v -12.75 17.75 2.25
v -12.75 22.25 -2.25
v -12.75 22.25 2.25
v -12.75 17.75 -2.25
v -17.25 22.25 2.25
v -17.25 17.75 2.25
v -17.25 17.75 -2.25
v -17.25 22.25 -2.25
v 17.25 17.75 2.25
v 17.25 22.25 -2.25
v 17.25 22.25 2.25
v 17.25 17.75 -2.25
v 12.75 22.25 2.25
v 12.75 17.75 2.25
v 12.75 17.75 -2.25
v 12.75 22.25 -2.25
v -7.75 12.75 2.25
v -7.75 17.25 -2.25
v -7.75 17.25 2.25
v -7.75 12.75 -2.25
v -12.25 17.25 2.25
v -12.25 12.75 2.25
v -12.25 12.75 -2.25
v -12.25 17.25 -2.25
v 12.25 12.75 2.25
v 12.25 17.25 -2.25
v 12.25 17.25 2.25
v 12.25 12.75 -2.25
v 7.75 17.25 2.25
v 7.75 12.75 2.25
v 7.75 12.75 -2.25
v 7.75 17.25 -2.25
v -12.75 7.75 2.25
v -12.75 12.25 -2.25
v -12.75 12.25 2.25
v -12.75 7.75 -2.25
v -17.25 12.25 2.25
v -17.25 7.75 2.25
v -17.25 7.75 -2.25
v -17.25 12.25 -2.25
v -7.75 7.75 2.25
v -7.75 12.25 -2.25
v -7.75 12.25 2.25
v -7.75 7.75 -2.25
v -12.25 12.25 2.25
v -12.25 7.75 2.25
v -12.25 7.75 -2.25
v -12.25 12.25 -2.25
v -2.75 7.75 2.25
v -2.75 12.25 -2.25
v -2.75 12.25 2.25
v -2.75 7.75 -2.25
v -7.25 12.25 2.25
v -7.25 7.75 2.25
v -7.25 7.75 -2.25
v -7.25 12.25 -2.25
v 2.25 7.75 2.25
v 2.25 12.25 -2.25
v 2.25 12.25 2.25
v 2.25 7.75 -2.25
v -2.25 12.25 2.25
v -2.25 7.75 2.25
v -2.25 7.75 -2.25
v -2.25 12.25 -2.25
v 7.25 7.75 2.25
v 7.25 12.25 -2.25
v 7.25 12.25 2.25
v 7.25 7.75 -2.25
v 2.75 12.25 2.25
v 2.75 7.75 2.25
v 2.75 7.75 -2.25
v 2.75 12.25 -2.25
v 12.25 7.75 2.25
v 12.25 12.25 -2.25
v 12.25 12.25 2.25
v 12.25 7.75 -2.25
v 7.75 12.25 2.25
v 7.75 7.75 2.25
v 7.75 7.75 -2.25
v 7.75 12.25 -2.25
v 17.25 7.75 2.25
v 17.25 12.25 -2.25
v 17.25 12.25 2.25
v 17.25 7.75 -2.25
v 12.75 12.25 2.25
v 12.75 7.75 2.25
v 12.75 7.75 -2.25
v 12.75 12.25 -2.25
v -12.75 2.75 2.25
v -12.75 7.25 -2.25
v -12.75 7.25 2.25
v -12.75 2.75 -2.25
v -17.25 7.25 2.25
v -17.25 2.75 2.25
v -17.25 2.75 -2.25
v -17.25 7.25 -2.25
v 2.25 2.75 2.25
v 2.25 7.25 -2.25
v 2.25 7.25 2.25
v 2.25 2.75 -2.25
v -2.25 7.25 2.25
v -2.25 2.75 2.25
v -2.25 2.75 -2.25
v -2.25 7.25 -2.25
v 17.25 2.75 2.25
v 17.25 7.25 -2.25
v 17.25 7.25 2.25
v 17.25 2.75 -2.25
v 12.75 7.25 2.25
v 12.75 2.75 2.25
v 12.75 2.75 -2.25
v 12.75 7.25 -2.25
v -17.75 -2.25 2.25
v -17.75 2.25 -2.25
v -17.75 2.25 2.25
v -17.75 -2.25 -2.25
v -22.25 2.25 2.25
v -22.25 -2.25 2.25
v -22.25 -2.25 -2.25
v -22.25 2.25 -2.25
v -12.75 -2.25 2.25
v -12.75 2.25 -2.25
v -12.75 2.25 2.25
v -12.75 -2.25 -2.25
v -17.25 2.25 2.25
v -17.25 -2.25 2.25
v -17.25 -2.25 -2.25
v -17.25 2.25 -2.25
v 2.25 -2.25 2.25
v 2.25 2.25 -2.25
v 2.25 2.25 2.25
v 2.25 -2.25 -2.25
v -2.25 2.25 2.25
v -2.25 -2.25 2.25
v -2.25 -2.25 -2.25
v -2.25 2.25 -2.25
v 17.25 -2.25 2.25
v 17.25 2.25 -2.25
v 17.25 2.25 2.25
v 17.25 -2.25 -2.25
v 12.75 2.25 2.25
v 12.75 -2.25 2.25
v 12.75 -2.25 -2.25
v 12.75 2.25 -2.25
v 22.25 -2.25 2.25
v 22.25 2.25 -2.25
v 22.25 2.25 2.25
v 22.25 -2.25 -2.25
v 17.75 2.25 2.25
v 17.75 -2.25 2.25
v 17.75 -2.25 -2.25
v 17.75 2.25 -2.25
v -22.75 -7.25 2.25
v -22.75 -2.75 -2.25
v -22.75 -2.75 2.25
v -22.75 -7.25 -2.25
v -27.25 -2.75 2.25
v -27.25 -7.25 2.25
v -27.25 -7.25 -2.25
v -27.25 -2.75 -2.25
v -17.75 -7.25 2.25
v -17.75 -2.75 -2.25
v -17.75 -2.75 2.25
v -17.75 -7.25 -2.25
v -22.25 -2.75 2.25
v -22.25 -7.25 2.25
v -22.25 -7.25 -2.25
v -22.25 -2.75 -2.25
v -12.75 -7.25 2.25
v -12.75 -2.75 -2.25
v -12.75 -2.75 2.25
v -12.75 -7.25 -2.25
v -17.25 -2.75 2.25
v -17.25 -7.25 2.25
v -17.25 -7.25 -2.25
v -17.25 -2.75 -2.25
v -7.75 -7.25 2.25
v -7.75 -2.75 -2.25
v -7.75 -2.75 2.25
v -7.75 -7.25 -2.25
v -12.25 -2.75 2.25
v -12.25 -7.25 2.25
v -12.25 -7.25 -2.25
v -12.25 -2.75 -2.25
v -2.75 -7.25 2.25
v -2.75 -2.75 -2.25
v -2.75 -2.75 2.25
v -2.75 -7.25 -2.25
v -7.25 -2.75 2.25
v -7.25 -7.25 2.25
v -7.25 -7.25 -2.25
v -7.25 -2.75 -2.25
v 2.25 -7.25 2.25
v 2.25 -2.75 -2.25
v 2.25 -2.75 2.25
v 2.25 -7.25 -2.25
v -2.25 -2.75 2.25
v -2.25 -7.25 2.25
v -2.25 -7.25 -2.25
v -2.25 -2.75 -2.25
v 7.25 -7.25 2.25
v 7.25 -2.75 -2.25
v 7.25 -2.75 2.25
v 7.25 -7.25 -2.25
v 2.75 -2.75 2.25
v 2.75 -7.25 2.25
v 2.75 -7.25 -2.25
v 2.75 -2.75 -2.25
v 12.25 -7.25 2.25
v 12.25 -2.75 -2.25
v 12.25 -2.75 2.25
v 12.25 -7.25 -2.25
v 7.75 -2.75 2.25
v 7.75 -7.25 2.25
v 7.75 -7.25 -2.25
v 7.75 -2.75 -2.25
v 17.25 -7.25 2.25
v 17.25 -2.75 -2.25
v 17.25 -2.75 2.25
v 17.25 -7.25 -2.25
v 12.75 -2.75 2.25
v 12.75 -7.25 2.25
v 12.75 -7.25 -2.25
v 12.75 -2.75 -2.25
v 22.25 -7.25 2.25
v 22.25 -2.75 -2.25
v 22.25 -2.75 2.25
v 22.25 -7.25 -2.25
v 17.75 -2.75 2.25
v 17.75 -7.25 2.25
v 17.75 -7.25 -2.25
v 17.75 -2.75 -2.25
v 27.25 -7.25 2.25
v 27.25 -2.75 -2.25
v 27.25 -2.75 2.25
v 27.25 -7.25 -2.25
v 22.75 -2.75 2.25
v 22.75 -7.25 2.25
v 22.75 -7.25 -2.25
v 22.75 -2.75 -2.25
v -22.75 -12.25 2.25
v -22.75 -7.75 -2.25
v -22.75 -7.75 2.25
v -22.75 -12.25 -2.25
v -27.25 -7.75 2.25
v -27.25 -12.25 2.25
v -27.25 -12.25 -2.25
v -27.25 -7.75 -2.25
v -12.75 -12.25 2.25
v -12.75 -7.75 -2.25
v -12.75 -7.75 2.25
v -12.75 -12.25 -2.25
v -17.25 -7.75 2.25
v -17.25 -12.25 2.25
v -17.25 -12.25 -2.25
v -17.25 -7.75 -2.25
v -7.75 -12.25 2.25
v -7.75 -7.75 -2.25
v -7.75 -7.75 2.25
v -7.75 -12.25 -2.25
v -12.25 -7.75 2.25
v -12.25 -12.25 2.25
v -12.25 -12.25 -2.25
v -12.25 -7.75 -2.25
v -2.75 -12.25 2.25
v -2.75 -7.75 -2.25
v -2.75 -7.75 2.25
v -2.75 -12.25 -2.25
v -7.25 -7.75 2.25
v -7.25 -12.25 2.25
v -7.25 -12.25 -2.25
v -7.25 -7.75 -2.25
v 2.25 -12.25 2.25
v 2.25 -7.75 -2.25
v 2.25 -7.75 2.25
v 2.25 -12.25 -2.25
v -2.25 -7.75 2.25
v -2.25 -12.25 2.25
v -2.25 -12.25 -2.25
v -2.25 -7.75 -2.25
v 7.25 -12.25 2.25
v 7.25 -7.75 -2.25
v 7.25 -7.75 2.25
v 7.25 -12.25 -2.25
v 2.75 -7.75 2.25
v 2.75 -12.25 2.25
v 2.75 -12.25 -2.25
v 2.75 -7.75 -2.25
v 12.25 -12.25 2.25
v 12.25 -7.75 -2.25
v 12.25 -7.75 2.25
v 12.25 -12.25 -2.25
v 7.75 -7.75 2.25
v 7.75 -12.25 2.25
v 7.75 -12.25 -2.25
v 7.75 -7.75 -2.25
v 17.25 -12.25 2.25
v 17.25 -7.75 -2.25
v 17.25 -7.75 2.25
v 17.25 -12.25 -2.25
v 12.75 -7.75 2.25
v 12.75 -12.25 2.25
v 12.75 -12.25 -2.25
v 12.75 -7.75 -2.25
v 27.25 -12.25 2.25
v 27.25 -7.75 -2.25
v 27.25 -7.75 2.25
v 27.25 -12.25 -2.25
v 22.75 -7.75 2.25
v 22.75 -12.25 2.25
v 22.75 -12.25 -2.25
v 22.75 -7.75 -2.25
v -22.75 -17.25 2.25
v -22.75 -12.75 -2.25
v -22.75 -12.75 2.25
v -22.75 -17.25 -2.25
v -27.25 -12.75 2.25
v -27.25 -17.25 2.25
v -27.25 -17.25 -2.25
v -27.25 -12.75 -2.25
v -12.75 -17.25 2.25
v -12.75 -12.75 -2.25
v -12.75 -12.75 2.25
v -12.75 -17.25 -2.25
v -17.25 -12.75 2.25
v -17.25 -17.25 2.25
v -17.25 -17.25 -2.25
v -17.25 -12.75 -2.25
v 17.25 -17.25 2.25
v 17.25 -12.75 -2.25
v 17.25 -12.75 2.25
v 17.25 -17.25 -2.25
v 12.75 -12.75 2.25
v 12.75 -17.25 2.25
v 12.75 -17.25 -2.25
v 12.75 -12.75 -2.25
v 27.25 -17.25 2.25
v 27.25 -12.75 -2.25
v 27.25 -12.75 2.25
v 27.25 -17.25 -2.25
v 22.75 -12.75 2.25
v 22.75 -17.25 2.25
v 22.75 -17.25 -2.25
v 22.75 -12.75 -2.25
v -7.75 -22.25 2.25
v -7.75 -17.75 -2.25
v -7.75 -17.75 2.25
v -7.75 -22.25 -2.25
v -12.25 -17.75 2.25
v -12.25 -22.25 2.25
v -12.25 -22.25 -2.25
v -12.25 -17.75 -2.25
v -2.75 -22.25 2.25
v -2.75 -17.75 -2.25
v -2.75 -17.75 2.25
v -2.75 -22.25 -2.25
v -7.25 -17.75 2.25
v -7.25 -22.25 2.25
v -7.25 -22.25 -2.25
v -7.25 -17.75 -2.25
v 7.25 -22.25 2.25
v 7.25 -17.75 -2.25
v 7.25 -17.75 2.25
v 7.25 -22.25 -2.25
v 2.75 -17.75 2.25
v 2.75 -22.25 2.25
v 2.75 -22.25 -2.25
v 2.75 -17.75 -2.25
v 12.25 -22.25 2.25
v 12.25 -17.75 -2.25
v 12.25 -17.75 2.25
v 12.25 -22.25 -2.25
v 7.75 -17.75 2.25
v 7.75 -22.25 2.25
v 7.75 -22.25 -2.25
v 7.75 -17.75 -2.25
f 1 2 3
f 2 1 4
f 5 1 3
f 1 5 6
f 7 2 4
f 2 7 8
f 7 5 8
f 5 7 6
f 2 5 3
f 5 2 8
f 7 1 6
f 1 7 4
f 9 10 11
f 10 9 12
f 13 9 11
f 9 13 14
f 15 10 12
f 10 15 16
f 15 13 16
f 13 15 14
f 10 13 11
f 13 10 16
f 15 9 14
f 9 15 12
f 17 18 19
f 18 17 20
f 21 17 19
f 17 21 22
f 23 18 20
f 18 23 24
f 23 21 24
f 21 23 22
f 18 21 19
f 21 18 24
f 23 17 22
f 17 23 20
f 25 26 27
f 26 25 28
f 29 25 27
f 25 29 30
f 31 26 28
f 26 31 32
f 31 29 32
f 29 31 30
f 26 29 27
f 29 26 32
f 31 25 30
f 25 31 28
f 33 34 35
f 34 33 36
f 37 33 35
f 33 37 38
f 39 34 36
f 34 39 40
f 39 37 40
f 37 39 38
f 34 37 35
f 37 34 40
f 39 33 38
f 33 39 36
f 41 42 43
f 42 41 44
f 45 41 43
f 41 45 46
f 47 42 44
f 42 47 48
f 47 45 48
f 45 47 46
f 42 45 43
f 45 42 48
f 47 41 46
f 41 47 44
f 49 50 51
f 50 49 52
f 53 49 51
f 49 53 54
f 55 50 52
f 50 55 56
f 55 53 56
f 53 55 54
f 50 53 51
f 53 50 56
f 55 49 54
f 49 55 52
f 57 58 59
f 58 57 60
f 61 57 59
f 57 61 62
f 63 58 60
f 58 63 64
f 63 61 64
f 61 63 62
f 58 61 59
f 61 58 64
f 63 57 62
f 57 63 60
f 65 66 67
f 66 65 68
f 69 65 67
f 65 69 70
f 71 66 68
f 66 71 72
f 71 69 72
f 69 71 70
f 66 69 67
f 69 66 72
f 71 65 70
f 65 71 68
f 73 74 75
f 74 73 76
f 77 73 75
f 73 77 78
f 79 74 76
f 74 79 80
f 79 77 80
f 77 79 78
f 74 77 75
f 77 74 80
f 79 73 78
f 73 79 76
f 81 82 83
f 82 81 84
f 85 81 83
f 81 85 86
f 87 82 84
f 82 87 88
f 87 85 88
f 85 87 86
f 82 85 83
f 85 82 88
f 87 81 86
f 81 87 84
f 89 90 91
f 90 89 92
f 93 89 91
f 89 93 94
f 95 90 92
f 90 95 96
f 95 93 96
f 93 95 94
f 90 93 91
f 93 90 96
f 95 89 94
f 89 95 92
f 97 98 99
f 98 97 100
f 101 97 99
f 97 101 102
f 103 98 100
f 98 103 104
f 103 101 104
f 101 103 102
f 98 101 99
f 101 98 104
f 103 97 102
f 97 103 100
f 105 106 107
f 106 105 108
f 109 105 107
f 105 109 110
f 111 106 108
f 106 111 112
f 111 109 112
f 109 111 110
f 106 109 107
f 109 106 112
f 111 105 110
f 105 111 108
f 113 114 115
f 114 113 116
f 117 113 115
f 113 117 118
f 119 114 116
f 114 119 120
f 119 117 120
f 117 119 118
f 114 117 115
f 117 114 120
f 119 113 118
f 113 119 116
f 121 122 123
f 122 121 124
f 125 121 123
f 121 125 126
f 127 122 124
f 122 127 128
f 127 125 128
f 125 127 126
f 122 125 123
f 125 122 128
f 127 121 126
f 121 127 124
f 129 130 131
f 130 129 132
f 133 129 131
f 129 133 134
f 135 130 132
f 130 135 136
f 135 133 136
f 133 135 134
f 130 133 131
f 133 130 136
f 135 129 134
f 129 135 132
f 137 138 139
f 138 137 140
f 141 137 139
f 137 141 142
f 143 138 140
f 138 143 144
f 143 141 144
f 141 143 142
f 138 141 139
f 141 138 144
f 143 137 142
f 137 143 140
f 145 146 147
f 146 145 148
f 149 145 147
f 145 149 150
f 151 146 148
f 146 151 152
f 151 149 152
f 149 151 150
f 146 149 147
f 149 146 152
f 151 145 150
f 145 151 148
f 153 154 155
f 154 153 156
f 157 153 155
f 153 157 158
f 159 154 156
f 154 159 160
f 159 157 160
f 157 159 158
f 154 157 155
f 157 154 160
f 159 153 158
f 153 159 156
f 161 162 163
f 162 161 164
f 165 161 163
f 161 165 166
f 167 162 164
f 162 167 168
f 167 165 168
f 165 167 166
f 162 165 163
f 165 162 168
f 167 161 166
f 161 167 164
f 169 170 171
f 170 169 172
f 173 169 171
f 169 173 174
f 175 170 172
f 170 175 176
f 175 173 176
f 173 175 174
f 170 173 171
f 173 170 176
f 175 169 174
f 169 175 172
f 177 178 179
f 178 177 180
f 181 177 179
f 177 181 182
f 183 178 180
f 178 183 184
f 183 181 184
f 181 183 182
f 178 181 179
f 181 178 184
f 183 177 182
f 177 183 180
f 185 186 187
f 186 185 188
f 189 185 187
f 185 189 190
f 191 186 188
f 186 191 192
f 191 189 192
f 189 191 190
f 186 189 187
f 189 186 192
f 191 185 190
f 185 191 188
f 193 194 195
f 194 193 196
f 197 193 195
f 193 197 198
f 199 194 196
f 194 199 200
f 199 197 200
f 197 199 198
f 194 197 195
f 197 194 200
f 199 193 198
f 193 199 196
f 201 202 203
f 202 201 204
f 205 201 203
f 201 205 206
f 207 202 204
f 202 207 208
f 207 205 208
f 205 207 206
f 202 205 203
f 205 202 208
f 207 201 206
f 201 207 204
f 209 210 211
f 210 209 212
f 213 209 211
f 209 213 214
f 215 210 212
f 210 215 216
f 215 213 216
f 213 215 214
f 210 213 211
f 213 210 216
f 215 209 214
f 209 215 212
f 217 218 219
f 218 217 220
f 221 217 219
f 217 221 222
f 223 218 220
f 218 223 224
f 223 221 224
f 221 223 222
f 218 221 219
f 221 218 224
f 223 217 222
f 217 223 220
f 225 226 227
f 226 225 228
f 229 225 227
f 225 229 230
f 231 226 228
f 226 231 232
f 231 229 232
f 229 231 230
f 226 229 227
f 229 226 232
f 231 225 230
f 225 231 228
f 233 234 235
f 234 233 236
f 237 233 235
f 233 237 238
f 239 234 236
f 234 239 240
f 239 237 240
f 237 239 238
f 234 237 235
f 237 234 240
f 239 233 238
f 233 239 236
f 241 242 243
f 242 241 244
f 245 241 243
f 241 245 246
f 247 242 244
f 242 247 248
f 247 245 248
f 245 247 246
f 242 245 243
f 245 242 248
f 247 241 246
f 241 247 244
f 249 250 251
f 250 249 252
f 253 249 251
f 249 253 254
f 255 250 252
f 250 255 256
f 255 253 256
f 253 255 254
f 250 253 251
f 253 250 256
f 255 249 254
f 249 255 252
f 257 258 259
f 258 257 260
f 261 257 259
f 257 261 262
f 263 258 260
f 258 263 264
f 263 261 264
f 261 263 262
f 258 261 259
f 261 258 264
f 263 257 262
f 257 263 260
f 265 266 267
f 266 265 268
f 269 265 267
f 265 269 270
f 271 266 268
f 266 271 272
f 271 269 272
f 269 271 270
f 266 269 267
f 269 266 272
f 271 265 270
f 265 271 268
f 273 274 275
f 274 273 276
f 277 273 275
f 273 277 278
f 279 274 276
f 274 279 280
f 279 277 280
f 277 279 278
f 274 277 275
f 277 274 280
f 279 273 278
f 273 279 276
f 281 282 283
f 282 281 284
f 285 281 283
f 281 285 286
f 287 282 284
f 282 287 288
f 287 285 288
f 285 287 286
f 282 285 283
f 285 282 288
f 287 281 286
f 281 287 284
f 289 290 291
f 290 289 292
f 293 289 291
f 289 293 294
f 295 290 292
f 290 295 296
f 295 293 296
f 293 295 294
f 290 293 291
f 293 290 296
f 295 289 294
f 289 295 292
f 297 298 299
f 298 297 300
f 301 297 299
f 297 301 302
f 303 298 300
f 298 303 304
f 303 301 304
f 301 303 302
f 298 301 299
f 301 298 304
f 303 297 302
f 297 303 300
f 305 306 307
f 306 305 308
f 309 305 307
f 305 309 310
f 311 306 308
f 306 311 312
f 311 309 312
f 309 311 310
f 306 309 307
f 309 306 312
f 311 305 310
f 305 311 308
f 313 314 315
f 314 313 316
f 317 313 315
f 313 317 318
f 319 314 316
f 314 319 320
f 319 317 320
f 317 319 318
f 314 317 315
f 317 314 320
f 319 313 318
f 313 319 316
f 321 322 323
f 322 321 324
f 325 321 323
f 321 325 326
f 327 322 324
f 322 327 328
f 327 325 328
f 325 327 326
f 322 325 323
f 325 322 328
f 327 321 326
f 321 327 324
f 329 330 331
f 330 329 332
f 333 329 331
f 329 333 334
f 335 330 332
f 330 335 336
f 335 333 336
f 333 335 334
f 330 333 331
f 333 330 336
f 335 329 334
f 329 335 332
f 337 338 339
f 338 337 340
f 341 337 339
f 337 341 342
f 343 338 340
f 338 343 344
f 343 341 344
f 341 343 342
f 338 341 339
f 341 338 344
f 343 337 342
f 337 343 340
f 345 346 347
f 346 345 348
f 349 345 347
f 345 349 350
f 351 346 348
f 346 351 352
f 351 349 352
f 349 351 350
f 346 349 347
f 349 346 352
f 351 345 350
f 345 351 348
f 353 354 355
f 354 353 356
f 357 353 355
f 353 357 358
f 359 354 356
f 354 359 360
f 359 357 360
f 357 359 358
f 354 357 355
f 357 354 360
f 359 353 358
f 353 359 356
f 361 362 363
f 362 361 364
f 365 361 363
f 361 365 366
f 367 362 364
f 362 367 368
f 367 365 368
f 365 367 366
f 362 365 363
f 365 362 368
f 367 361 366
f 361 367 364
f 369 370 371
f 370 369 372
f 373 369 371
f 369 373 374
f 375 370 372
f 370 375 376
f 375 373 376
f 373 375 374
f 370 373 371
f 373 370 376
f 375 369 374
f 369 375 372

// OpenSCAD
// [FL_INDEX: keywords="openscad, 3d_parametric, 2D_Pixel_Art, csg_solid" | COT="Parametric OpenSCAD design from 3DCodeverse"]
// Title: 2D Pixel Art

/*
2D Pixel Art
*/

/* [Draw] */

// Your art : each line starts with a '/';'*' makes a pixel;any other character is ignored
pixels="/__*_____*__/___*___*___/__*******__/__*__*__*__/_**__*__**_/***********/*_*******_*/*_*_____*_*/___**_**___"; 

/* [Dimensions] */

// mm per x unit
xUnit=5; // [0:100]

// mm per y unit
yUnit=5; // [0:100]

// mm per z unit
zUnit=5; // [0:100]

// percentage of overlap between pixels
overlap=-10; //[-100:100]

overlapFactor=1+overlap/100;
//pixelsDimension=[pixelsPerLines,rows]*1;


unitSize=[xUnit,yUnit,zUnit]*1;

newPixel(pixels,unitSize,overlapFactor,center=true);

module newPixel(pixels,unitSize,overlapFactor,center){
	
	lines = split(pixels,"/");
	size = [len(lines[0]),len(lines)];

	translate(center ? [unitSize[0]*(size[0]-1),unitSize[1]*(size[1]-1),0]*(center?-1/2:0) : unitSize/2)
	for (y=[0:size[1]-1]){
		for (x=[0:len(lines[y])-1]){
		
			if (lines[y][x]=="*"){
				translate([x*unitSize[0],(size[1]-y-1)*unitSize[1],0])	
				cube(unitSize*overlapFactor,center=true);
			}
		}
	}
}

function subString(theString,from,to)=
	to==0?"":str(subString(theString,from,to-1),theString[from+to]);

function splitInfo(positions,values)=
	[for (index = [0:len(positions)-1]) [positions[index],(positions[index+1]==undef?len(values):positions[index+1])-positions[index]-1] ];

function split(theString, splitChar)= 
	[ for (position = splitInfo(search(splitChar,theString, 0)[0],theString)) subString(theString,position[0],position[1])];
